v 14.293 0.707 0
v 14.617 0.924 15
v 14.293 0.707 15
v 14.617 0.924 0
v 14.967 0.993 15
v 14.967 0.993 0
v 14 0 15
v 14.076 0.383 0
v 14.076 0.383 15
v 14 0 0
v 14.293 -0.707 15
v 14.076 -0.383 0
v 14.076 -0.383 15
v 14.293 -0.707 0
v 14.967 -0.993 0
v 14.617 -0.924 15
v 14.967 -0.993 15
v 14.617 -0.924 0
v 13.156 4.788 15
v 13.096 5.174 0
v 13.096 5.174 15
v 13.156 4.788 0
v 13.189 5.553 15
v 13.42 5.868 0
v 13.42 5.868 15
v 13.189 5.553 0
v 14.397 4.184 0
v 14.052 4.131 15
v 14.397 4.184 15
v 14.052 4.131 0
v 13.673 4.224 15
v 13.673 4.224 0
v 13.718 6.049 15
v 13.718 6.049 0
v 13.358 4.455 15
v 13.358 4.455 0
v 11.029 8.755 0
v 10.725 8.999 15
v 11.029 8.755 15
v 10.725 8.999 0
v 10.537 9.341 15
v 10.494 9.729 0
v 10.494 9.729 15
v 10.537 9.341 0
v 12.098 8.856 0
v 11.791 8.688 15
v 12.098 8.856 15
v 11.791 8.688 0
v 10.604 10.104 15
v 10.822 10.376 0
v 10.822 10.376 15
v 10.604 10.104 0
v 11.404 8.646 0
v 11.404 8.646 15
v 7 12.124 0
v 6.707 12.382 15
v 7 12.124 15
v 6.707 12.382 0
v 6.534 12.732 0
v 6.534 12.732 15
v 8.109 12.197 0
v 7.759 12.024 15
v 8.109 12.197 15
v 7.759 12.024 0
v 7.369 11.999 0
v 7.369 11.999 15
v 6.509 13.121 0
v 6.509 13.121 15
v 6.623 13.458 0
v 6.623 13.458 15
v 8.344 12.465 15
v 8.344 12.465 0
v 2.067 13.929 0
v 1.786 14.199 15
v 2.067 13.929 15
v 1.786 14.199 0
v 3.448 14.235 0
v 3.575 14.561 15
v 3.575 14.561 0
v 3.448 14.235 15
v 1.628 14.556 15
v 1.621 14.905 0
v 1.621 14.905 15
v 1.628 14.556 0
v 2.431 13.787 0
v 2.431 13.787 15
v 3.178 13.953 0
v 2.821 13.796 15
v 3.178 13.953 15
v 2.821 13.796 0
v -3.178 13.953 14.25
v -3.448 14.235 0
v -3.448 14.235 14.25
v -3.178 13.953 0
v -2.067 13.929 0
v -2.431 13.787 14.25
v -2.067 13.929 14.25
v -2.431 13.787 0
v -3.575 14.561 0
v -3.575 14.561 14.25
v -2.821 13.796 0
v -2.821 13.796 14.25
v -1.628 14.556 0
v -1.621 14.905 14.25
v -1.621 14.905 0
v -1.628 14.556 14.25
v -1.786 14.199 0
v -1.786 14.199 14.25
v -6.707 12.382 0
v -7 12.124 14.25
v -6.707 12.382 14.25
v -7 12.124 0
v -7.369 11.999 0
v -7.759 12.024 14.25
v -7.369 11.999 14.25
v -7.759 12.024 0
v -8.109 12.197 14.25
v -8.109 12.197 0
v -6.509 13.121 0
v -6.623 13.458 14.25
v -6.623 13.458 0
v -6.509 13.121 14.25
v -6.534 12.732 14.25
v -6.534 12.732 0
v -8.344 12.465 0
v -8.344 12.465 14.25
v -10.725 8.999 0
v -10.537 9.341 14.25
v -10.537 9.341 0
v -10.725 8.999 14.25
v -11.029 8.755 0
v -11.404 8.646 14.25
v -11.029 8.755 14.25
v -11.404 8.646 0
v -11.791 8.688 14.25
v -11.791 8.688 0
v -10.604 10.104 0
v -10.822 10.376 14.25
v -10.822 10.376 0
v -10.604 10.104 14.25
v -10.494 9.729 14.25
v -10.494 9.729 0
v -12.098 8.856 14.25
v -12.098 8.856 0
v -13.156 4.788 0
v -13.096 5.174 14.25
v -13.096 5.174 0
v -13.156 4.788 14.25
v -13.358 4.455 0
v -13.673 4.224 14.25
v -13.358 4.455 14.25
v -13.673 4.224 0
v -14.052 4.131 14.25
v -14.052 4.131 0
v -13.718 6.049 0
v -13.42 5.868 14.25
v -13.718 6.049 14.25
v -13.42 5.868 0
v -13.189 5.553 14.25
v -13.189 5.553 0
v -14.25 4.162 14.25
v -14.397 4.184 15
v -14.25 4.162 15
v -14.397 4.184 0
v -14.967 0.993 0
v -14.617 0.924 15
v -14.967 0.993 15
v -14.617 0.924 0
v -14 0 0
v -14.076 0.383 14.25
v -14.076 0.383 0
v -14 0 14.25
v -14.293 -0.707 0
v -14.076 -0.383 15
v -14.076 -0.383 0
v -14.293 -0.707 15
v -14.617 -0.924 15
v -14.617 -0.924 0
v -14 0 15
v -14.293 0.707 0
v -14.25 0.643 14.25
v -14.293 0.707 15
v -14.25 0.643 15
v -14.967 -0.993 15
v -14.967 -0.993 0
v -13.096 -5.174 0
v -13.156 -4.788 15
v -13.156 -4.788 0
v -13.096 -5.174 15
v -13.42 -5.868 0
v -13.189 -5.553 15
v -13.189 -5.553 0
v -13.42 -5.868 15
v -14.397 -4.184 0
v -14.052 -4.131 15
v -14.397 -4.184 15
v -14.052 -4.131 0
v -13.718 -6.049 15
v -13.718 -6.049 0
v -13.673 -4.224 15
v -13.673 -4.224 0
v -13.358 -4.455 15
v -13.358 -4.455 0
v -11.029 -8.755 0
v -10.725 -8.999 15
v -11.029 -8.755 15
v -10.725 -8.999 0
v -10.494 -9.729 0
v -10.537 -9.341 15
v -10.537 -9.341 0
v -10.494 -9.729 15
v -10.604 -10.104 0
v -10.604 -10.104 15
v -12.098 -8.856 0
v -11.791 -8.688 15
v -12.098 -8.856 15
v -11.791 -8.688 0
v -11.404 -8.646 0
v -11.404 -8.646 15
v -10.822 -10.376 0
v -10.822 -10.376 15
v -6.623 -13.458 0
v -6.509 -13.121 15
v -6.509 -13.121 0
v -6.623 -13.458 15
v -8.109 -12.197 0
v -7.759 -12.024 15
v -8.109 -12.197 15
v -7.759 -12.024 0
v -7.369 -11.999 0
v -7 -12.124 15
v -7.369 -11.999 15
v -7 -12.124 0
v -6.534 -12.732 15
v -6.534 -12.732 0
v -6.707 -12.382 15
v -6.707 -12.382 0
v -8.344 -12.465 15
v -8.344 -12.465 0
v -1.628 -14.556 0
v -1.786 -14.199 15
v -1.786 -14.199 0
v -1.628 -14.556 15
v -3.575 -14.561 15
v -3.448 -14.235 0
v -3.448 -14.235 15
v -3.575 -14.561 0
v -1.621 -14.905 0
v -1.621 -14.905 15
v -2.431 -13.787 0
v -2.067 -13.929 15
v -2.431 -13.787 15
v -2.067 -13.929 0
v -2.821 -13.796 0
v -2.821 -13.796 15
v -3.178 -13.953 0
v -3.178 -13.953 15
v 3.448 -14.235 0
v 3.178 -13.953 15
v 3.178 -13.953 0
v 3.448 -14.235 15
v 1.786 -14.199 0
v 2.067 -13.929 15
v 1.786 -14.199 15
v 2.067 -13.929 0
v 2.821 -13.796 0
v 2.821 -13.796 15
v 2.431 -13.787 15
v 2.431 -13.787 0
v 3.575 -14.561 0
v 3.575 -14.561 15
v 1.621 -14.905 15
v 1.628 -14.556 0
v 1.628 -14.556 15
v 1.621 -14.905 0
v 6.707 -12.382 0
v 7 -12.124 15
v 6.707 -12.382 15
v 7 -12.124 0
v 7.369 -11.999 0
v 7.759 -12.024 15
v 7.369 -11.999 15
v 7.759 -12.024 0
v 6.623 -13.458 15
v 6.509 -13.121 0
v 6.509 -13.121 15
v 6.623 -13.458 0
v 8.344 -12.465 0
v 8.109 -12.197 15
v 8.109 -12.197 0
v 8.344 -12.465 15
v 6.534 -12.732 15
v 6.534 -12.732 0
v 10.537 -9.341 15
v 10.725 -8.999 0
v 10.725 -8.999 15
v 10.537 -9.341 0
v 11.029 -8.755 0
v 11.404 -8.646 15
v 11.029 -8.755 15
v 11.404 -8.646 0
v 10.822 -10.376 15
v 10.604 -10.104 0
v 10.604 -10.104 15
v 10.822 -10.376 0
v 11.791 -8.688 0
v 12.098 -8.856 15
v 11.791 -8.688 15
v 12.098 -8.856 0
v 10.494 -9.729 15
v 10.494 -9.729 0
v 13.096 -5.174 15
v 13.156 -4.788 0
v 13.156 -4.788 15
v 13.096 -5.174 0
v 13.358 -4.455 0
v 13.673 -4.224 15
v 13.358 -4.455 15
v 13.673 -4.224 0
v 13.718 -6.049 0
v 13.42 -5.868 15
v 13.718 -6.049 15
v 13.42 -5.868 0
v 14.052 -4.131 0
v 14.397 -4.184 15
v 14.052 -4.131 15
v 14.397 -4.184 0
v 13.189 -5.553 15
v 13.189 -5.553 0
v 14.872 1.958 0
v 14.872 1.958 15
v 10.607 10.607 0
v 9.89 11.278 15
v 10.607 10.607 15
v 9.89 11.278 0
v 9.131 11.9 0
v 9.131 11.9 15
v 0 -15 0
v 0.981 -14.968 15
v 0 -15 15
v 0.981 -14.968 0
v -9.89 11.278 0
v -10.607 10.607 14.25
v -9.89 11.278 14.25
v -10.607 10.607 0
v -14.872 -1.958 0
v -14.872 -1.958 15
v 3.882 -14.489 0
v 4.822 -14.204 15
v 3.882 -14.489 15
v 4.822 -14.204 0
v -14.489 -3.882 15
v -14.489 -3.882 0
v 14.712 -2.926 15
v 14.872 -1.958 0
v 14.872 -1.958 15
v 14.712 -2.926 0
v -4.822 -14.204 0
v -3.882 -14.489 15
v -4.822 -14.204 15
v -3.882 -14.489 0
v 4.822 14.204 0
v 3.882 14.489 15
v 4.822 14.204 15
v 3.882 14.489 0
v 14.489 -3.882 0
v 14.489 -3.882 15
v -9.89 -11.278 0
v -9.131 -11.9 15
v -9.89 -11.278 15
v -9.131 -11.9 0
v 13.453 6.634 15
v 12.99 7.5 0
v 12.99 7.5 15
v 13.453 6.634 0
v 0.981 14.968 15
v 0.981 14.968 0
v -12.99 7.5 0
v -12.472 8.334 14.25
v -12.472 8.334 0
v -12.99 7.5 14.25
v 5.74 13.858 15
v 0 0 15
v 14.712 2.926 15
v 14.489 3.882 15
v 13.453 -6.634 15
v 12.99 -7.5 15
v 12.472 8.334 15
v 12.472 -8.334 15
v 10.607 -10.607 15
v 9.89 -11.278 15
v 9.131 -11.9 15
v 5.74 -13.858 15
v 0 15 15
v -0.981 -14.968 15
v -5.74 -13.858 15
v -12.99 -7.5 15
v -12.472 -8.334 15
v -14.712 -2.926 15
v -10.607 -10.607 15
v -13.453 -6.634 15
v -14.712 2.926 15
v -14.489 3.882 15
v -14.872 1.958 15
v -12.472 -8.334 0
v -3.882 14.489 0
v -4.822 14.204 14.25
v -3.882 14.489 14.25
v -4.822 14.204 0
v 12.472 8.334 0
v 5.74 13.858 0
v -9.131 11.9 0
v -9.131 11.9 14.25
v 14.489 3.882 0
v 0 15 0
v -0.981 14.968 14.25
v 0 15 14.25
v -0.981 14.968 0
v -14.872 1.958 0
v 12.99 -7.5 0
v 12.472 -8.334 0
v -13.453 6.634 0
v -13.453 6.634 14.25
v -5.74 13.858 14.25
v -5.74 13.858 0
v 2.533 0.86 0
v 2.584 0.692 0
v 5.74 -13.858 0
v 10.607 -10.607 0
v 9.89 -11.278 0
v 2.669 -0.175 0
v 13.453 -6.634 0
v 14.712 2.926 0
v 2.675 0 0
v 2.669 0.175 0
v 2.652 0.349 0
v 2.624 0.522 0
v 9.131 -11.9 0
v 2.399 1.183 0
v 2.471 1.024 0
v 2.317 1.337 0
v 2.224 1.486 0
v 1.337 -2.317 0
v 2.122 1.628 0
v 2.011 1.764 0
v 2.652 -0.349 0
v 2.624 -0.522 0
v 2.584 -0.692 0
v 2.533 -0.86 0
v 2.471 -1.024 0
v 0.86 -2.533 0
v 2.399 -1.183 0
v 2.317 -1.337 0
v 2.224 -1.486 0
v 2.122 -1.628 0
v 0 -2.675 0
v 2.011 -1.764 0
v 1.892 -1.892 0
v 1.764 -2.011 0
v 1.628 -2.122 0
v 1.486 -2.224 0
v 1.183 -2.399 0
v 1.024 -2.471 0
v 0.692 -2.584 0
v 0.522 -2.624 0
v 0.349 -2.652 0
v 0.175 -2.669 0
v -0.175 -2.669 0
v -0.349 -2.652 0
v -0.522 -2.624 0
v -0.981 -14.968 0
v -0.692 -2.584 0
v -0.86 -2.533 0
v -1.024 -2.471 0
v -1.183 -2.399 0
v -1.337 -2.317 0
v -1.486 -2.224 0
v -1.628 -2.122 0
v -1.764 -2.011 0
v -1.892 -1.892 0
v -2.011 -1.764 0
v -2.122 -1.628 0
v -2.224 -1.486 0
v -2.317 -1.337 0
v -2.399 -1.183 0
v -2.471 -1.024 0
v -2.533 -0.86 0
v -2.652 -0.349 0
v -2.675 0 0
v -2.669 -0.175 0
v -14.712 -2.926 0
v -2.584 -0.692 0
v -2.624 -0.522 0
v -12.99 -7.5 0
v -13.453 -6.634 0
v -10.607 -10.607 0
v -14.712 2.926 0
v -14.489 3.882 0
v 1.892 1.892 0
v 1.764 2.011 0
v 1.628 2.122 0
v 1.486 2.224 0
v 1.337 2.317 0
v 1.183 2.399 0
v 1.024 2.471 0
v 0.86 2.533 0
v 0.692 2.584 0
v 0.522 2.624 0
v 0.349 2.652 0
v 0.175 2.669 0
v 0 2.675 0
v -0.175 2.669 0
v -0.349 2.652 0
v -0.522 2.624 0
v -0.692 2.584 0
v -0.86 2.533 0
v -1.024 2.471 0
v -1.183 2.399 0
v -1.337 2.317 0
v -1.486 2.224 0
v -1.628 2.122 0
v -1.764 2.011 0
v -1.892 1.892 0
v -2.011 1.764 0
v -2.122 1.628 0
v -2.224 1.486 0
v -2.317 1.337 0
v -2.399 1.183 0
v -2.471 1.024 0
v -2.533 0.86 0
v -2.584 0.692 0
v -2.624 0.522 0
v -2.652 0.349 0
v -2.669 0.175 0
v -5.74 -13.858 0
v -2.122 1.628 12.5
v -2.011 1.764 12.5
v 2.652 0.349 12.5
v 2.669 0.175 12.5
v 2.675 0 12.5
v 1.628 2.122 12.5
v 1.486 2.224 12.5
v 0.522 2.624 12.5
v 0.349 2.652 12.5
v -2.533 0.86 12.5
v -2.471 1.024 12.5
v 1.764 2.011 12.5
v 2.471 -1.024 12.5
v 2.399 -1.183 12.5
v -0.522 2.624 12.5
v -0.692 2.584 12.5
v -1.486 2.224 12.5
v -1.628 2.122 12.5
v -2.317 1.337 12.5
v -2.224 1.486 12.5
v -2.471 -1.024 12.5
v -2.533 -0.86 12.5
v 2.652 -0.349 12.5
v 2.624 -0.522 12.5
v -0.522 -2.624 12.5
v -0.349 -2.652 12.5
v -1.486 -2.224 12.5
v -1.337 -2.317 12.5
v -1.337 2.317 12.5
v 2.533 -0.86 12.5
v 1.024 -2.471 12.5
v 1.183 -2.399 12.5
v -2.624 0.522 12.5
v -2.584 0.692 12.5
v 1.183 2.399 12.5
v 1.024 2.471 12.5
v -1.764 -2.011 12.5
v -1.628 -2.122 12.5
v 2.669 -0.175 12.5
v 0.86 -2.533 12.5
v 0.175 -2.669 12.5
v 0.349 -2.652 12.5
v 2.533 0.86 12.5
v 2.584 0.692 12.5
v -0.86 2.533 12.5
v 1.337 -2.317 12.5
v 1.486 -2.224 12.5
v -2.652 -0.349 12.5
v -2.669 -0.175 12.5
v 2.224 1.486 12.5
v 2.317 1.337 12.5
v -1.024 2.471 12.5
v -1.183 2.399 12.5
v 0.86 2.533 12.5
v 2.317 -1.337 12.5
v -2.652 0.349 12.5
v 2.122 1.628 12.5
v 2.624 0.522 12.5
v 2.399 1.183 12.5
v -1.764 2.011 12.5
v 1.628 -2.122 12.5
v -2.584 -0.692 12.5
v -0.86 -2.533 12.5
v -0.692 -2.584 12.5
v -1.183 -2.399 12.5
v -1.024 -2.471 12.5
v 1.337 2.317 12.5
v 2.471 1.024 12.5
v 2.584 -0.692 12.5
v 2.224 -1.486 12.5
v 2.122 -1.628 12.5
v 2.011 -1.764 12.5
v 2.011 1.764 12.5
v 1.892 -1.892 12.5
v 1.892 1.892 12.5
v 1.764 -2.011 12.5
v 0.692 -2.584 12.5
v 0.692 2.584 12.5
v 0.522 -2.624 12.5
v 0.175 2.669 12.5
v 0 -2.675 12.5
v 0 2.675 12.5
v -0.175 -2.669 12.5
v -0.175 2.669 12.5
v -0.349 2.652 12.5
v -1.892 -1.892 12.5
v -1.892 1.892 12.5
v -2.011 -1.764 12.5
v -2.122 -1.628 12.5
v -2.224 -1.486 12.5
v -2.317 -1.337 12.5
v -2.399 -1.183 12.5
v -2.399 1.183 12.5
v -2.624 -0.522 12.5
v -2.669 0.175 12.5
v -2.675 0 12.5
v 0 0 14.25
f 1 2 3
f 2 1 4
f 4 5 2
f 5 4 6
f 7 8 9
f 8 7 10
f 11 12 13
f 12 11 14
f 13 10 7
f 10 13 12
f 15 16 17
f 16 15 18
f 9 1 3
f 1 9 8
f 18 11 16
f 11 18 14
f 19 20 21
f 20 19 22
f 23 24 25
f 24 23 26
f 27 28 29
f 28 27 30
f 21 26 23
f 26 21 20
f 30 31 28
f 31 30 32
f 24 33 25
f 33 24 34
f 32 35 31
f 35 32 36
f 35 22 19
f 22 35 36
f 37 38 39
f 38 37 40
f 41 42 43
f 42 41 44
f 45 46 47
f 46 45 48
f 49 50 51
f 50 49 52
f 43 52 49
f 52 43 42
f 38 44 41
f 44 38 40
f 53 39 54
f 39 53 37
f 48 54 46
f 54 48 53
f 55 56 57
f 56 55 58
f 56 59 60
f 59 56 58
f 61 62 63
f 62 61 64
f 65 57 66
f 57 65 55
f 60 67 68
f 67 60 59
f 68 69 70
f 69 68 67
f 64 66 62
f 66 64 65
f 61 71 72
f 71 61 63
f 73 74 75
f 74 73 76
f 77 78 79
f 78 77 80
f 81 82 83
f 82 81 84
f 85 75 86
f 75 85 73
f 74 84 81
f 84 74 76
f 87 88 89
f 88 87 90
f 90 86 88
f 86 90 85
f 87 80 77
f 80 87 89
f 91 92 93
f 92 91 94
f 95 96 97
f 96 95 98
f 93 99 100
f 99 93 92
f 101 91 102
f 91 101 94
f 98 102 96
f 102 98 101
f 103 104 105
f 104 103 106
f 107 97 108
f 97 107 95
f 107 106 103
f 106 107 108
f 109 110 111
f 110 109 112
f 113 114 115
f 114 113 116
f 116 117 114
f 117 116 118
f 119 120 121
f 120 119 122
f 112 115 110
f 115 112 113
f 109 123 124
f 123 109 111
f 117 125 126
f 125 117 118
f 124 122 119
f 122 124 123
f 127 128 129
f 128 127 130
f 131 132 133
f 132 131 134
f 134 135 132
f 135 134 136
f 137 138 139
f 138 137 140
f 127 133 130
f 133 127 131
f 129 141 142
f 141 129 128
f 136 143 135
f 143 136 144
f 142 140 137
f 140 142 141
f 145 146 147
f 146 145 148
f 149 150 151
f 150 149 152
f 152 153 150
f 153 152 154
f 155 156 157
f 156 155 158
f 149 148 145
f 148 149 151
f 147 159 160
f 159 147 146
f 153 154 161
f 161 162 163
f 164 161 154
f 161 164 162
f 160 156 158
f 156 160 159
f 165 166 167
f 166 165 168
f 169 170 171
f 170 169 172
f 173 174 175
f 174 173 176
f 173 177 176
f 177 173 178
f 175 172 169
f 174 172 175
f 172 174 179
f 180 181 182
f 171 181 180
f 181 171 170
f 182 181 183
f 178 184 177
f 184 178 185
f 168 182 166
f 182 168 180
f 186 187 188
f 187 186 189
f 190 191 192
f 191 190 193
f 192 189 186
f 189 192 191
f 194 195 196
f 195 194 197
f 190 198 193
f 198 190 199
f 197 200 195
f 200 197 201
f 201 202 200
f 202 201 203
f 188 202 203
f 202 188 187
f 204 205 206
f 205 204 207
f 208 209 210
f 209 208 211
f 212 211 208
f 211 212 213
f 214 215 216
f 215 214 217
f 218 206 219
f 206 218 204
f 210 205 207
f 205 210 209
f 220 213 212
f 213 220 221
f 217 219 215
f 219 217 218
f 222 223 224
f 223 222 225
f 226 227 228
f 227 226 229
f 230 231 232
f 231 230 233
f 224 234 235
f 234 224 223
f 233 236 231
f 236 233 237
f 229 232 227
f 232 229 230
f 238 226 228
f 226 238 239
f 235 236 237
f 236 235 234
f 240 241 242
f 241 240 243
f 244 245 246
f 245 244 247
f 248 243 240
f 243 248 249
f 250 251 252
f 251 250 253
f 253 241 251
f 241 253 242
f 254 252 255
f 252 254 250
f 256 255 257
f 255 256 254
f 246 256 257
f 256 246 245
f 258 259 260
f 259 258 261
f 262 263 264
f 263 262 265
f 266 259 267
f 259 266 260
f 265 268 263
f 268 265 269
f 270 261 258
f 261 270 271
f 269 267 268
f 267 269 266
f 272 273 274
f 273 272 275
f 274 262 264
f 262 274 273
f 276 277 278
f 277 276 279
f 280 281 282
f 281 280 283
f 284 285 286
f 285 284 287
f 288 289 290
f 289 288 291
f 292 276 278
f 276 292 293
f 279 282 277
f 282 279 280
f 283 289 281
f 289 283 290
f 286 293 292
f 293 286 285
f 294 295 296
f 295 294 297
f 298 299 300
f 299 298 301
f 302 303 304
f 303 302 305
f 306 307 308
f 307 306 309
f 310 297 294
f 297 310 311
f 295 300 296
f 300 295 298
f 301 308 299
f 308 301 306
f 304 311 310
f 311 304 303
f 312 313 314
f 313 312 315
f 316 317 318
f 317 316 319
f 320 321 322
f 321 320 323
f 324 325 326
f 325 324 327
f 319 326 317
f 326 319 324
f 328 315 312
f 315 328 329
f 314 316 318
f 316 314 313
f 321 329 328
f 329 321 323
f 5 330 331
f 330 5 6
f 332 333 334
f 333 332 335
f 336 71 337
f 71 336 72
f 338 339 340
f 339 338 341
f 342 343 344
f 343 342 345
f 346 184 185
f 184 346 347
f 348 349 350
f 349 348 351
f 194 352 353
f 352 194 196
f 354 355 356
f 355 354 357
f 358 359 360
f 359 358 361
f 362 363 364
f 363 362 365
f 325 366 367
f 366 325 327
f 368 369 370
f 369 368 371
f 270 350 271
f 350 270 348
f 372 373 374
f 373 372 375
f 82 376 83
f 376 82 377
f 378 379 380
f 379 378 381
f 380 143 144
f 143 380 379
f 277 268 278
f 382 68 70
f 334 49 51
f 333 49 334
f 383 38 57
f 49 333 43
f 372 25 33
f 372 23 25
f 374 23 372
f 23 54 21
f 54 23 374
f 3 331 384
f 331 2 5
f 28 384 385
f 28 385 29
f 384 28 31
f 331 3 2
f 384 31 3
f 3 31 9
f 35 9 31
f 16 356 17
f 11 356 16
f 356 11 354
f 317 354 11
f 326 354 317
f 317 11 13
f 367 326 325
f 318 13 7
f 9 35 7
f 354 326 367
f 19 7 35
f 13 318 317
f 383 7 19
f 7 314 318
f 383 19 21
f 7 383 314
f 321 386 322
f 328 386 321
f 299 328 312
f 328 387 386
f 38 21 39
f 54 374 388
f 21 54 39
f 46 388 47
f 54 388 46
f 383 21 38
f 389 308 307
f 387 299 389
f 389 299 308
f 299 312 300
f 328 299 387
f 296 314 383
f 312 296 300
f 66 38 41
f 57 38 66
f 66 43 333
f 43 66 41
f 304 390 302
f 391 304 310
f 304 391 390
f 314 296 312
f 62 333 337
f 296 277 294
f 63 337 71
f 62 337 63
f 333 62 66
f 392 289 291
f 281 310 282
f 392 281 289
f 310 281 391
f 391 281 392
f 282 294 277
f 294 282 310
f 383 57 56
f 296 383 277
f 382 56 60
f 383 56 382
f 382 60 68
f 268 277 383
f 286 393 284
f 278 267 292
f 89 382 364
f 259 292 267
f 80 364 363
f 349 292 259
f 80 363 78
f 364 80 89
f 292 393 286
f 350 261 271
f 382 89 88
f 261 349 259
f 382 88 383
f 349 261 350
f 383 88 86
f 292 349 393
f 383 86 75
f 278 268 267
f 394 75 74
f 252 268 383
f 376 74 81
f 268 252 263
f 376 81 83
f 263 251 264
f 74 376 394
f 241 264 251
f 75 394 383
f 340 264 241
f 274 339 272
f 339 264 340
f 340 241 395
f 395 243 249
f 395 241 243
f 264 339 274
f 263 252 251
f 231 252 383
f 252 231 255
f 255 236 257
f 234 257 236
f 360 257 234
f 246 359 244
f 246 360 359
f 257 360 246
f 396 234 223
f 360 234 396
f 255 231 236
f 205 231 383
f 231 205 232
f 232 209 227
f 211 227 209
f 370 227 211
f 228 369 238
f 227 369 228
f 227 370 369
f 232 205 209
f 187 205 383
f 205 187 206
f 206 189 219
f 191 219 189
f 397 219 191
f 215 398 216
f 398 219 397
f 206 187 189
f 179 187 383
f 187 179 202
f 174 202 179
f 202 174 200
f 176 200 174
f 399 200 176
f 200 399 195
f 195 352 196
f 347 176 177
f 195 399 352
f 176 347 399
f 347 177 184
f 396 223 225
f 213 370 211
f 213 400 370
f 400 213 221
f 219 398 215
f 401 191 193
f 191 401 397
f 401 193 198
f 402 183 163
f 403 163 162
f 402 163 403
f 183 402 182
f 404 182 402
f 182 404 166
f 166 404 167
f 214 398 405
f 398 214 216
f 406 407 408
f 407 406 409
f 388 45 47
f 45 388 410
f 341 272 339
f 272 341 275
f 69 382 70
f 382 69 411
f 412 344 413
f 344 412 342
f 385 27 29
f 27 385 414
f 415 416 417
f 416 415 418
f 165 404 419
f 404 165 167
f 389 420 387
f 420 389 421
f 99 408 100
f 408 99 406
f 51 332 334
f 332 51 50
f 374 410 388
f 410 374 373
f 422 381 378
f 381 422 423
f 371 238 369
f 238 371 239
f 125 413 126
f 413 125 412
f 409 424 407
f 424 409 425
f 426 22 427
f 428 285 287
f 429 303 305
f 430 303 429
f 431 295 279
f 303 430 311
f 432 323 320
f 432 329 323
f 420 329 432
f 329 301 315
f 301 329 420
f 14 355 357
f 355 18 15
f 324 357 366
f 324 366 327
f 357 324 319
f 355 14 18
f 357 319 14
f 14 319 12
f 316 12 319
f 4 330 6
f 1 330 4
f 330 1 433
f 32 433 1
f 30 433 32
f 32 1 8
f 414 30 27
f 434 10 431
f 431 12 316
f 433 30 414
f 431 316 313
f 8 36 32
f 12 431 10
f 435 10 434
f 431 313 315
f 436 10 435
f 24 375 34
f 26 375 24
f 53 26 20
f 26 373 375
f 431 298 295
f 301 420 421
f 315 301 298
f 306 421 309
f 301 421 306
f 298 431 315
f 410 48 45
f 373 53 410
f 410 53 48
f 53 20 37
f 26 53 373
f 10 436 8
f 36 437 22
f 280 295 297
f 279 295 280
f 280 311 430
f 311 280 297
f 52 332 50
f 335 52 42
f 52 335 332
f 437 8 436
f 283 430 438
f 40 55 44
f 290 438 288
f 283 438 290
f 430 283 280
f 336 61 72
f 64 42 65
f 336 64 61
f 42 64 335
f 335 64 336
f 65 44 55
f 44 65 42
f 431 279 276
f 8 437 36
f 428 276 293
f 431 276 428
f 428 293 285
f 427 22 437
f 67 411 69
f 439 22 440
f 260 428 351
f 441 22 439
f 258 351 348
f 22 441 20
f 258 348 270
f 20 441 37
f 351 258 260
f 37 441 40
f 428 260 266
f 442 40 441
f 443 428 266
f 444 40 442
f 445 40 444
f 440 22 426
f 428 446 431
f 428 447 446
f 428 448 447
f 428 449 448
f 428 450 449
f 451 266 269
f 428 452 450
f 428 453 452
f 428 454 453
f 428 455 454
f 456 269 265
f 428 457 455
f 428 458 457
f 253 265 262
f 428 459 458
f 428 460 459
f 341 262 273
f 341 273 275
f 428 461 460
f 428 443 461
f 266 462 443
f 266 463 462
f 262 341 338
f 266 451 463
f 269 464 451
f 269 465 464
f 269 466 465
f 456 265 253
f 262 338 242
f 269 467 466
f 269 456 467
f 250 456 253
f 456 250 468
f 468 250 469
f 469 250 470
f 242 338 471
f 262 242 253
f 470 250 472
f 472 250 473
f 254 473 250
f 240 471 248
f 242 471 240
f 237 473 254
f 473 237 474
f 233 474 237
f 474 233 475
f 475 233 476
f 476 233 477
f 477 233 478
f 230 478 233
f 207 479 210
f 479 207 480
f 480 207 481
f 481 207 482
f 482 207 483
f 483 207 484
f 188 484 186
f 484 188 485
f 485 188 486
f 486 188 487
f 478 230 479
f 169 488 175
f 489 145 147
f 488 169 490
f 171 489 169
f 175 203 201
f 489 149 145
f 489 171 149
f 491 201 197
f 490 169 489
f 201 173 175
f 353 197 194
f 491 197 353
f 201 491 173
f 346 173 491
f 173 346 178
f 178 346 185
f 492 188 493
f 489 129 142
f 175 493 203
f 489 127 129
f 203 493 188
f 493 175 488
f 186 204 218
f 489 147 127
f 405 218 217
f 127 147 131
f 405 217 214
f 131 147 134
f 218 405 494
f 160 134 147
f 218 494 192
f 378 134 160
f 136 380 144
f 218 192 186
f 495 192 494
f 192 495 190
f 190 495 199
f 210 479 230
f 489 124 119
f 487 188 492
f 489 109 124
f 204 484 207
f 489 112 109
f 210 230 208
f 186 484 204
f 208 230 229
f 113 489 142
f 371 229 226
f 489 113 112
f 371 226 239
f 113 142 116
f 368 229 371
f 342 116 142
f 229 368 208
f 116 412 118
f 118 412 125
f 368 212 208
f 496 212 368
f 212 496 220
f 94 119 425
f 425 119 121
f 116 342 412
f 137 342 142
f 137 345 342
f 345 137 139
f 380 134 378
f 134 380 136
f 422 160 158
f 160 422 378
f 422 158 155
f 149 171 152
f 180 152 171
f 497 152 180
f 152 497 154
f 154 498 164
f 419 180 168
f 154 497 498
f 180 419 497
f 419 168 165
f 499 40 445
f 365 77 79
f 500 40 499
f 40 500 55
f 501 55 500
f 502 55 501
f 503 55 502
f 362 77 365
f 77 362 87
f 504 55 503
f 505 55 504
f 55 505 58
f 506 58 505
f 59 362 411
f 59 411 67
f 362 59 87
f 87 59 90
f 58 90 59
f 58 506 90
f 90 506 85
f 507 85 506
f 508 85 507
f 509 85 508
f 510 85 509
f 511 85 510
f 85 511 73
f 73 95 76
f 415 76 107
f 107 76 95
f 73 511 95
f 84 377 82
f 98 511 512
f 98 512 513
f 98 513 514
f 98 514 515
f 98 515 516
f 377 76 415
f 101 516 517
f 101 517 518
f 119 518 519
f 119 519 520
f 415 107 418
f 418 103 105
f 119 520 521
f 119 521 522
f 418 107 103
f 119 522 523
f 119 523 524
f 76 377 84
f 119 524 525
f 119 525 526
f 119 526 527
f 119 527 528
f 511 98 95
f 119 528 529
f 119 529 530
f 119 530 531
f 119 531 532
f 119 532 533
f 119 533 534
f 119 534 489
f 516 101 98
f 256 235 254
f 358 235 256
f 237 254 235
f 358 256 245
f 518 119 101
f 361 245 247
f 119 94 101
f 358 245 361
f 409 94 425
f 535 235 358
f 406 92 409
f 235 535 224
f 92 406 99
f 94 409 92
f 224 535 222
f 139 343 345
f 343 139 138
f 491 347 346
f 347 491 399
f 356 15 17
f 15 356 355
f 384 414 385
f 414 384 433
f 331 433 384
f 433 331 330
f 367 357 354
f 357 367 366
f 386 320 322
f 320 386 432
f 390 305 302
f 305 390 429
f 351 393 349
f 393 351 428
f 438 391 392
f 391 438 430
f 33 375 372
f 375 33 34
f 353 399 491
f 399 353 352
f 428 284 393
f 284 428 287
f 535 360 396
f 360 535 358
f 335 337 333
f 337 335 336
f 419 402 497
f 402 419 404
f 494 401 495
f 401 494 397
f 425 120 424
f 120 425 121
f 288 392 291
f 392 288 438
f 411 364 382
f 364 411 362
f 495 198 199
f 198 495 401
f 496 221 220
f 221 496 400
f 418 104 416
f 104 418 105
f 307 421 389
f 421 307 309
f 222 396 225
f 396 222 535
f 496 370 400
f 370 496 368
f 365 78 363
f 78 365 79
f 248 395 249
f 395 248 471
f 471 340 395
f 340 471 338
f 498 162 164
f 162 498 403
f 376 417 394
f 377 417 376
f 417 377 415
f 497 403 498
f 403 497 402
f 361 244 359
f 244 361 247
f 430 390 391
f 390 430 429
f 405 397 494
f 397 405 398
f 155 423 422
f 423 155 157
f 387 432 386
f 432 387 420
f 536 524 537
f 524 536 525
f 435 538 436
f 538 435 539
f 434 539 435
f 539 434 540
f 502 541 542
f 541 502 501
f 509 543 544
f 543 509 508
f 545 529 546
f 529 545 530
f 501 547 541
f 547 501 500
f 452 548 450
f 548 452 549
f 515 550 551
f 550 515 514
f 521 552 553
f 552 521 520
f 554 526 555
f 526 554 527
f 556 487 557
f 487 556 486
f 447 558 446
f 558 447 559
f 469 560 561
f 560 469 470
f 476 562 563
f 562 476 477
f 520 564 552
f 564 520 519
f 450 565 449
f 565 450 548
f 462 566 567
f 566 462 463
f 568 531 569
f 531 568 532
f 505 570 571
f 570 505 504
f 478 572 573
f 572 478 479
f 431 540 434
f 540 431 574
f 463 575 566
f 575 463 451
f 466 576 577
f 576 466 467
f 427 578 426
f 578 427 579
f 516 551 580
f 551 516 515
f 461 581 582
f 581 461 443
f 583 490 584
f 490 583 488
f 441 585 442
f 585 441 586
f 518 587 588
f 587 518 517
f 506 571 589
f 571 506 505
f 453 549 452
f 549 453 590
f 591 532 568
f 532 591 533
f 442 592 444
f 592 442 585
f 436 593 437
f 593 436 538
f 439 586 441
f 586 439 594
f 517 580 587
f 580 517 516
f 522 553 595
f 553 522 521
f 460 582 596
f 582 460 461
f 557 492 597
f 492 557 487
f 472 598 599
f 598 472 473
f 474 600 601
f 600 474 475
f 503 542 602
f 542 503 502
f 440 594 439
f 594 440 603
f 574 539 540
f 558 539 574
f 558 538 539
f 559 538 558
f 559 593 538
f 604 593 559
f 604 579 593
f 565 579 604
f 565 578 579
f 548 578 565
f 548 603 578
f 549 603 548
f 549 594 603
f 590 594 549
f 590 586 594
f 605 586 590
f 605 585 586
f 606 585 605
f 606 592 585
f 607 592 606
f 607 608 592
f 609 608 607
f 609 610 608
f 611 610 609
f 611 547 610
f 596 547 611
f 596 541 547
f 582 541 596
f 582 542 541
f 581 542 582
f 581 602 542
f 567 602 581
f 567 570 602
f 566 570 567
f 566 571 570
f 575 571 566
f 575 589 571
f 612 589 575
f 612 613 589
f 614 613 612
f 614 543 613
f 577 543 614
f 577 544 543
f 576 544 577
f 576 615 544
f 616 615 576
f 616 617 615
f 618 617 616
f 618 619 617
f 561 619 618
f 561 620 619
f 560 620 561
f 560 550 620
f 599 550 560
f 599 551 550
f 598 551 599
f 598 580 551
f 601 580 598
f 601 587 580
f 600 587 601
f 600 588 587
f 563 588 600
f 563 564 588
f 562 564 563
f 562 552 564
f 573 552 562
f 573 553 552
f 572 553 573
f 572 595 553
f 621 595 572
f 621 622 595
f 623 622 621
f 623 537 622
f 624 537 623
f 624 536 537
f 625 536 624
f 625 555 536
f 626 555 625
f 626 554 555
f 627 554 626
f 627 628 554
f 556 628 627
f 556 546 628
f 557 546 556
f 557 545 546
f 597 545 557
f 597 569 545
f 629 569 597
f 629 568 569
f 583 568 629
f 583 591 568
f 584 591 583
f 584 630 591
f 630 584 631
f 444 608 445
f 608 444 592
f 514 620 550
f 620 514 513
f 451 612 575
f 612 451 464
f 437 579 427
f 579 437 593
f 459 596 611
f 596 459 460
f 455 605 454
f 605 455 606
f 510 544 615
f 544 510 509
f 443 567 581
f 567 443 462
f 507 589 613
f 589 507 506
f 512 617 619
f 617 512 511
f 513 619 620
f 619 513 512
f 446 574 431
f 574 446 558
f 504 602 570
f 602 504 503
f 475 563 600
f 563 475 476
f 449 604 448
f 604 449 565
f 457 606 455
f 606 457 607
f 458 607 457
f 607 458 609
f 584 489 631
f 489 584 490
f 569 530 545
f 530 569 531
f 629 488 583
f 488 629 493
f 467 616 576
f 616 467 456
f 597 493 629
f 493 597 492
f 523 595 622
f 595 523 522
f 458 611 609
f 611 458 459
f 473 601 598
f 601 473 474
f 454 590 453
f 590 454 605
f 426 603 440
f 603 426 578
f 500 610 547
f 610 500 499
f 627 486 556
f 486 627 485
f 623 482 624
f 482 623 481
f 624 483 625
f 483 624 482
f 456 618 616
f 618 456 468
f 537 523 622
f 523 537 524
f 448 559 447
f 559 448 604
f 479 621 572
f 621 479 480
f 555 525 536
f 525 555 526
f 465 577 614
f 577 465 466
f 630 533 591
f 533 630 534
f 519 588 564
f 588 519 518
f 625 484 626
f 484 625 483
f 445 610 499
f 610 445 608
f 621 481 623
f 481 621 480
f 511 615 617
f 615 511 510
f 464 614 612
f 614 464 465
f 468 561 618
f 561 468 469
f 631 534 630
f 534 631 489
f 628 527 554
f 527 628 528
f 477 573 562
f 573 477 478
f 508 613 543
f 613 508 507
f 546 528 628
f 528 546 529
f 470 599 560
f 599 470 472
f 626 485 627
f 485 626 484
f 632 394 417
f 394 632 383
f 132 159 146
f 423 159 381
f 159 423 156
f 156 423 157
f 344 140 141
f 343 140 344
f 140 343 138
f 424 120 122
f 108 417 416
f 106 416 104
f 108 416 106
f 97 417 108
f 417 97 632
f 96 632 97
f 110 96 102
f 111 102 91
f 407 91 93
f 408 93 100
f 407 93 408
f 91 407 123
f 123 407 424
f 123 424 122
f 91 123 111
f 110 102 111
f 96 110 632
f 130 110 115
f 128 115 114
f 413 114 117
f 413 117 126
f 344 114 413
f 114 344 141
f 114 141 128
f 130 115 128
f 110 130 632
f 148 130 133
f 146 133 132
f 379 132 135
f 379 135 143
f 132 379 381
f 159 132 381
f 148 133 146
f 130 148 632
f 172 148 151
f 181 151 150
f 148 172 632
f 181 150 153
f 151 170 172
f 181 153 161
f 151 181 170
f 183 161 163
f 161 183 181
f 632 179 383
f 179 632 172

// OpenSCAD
// Replacement knob for a hotplate stirrer with a 6 mm D-shaft
// Print orientation: bottom face (with D-bore) on the bed at z = 0

// ---------------- Parameters ----------------
knob_d        = 30;    // knob outer diameter
knob_h        = 15;    // knob height
shaft_d       = 6;     // D-shaft diameter (for reference)

bore_depth    = 12;    // D-bore depth from bottom face
bore_w        = 4.7;   // D-bore width (flat to opposite side of circle)
bore_r        = bore_w / 2 + (shaft_d - bore_w) / 4; // radius of the 6.2 mm circle, adjusted for the flat

groove_count  = 18;    // number of vertical grip grooves
groove_d      = 2;     // groove diameter (half-cylinder)

pointer_w     = 1.5;   // pointer groove width
pointer_d     = pointer_w / 2; // pointer groove depth (1 mm)

eps           = 0.5;   // overcut so cutting faces are not coplanar
$fn           = 96;    // curve resolution

// ---------------- Model ----------------
difference() {
    // Main body
    cylinder(d = knob_d, h = knob_h);

    // D-shaped blind bore from the bottom face
    translate([0, 0, -eps])
        cylinder(r = bore_r, h = bore_depth + 2 * eps);

    // Vertical grip grooves around the full height
    for (i = [0 : groove_count - 1])
        rotate([0, 0, i * 360 / groove_count])
            translate([knob_d / 2, 0, -eps])
                cylinder(d = groove_d, h = knob_h + 2 * eps, $fn = 16);

    // Pointer groove on the top face, on the same side as the flat of the D
    translate([-(knob_d / 2 - pointer_d), 0, knob_h - pointer_d])
        cube([knob_d / 2 - pointer_d, knob_d, pointer_d]);
}
